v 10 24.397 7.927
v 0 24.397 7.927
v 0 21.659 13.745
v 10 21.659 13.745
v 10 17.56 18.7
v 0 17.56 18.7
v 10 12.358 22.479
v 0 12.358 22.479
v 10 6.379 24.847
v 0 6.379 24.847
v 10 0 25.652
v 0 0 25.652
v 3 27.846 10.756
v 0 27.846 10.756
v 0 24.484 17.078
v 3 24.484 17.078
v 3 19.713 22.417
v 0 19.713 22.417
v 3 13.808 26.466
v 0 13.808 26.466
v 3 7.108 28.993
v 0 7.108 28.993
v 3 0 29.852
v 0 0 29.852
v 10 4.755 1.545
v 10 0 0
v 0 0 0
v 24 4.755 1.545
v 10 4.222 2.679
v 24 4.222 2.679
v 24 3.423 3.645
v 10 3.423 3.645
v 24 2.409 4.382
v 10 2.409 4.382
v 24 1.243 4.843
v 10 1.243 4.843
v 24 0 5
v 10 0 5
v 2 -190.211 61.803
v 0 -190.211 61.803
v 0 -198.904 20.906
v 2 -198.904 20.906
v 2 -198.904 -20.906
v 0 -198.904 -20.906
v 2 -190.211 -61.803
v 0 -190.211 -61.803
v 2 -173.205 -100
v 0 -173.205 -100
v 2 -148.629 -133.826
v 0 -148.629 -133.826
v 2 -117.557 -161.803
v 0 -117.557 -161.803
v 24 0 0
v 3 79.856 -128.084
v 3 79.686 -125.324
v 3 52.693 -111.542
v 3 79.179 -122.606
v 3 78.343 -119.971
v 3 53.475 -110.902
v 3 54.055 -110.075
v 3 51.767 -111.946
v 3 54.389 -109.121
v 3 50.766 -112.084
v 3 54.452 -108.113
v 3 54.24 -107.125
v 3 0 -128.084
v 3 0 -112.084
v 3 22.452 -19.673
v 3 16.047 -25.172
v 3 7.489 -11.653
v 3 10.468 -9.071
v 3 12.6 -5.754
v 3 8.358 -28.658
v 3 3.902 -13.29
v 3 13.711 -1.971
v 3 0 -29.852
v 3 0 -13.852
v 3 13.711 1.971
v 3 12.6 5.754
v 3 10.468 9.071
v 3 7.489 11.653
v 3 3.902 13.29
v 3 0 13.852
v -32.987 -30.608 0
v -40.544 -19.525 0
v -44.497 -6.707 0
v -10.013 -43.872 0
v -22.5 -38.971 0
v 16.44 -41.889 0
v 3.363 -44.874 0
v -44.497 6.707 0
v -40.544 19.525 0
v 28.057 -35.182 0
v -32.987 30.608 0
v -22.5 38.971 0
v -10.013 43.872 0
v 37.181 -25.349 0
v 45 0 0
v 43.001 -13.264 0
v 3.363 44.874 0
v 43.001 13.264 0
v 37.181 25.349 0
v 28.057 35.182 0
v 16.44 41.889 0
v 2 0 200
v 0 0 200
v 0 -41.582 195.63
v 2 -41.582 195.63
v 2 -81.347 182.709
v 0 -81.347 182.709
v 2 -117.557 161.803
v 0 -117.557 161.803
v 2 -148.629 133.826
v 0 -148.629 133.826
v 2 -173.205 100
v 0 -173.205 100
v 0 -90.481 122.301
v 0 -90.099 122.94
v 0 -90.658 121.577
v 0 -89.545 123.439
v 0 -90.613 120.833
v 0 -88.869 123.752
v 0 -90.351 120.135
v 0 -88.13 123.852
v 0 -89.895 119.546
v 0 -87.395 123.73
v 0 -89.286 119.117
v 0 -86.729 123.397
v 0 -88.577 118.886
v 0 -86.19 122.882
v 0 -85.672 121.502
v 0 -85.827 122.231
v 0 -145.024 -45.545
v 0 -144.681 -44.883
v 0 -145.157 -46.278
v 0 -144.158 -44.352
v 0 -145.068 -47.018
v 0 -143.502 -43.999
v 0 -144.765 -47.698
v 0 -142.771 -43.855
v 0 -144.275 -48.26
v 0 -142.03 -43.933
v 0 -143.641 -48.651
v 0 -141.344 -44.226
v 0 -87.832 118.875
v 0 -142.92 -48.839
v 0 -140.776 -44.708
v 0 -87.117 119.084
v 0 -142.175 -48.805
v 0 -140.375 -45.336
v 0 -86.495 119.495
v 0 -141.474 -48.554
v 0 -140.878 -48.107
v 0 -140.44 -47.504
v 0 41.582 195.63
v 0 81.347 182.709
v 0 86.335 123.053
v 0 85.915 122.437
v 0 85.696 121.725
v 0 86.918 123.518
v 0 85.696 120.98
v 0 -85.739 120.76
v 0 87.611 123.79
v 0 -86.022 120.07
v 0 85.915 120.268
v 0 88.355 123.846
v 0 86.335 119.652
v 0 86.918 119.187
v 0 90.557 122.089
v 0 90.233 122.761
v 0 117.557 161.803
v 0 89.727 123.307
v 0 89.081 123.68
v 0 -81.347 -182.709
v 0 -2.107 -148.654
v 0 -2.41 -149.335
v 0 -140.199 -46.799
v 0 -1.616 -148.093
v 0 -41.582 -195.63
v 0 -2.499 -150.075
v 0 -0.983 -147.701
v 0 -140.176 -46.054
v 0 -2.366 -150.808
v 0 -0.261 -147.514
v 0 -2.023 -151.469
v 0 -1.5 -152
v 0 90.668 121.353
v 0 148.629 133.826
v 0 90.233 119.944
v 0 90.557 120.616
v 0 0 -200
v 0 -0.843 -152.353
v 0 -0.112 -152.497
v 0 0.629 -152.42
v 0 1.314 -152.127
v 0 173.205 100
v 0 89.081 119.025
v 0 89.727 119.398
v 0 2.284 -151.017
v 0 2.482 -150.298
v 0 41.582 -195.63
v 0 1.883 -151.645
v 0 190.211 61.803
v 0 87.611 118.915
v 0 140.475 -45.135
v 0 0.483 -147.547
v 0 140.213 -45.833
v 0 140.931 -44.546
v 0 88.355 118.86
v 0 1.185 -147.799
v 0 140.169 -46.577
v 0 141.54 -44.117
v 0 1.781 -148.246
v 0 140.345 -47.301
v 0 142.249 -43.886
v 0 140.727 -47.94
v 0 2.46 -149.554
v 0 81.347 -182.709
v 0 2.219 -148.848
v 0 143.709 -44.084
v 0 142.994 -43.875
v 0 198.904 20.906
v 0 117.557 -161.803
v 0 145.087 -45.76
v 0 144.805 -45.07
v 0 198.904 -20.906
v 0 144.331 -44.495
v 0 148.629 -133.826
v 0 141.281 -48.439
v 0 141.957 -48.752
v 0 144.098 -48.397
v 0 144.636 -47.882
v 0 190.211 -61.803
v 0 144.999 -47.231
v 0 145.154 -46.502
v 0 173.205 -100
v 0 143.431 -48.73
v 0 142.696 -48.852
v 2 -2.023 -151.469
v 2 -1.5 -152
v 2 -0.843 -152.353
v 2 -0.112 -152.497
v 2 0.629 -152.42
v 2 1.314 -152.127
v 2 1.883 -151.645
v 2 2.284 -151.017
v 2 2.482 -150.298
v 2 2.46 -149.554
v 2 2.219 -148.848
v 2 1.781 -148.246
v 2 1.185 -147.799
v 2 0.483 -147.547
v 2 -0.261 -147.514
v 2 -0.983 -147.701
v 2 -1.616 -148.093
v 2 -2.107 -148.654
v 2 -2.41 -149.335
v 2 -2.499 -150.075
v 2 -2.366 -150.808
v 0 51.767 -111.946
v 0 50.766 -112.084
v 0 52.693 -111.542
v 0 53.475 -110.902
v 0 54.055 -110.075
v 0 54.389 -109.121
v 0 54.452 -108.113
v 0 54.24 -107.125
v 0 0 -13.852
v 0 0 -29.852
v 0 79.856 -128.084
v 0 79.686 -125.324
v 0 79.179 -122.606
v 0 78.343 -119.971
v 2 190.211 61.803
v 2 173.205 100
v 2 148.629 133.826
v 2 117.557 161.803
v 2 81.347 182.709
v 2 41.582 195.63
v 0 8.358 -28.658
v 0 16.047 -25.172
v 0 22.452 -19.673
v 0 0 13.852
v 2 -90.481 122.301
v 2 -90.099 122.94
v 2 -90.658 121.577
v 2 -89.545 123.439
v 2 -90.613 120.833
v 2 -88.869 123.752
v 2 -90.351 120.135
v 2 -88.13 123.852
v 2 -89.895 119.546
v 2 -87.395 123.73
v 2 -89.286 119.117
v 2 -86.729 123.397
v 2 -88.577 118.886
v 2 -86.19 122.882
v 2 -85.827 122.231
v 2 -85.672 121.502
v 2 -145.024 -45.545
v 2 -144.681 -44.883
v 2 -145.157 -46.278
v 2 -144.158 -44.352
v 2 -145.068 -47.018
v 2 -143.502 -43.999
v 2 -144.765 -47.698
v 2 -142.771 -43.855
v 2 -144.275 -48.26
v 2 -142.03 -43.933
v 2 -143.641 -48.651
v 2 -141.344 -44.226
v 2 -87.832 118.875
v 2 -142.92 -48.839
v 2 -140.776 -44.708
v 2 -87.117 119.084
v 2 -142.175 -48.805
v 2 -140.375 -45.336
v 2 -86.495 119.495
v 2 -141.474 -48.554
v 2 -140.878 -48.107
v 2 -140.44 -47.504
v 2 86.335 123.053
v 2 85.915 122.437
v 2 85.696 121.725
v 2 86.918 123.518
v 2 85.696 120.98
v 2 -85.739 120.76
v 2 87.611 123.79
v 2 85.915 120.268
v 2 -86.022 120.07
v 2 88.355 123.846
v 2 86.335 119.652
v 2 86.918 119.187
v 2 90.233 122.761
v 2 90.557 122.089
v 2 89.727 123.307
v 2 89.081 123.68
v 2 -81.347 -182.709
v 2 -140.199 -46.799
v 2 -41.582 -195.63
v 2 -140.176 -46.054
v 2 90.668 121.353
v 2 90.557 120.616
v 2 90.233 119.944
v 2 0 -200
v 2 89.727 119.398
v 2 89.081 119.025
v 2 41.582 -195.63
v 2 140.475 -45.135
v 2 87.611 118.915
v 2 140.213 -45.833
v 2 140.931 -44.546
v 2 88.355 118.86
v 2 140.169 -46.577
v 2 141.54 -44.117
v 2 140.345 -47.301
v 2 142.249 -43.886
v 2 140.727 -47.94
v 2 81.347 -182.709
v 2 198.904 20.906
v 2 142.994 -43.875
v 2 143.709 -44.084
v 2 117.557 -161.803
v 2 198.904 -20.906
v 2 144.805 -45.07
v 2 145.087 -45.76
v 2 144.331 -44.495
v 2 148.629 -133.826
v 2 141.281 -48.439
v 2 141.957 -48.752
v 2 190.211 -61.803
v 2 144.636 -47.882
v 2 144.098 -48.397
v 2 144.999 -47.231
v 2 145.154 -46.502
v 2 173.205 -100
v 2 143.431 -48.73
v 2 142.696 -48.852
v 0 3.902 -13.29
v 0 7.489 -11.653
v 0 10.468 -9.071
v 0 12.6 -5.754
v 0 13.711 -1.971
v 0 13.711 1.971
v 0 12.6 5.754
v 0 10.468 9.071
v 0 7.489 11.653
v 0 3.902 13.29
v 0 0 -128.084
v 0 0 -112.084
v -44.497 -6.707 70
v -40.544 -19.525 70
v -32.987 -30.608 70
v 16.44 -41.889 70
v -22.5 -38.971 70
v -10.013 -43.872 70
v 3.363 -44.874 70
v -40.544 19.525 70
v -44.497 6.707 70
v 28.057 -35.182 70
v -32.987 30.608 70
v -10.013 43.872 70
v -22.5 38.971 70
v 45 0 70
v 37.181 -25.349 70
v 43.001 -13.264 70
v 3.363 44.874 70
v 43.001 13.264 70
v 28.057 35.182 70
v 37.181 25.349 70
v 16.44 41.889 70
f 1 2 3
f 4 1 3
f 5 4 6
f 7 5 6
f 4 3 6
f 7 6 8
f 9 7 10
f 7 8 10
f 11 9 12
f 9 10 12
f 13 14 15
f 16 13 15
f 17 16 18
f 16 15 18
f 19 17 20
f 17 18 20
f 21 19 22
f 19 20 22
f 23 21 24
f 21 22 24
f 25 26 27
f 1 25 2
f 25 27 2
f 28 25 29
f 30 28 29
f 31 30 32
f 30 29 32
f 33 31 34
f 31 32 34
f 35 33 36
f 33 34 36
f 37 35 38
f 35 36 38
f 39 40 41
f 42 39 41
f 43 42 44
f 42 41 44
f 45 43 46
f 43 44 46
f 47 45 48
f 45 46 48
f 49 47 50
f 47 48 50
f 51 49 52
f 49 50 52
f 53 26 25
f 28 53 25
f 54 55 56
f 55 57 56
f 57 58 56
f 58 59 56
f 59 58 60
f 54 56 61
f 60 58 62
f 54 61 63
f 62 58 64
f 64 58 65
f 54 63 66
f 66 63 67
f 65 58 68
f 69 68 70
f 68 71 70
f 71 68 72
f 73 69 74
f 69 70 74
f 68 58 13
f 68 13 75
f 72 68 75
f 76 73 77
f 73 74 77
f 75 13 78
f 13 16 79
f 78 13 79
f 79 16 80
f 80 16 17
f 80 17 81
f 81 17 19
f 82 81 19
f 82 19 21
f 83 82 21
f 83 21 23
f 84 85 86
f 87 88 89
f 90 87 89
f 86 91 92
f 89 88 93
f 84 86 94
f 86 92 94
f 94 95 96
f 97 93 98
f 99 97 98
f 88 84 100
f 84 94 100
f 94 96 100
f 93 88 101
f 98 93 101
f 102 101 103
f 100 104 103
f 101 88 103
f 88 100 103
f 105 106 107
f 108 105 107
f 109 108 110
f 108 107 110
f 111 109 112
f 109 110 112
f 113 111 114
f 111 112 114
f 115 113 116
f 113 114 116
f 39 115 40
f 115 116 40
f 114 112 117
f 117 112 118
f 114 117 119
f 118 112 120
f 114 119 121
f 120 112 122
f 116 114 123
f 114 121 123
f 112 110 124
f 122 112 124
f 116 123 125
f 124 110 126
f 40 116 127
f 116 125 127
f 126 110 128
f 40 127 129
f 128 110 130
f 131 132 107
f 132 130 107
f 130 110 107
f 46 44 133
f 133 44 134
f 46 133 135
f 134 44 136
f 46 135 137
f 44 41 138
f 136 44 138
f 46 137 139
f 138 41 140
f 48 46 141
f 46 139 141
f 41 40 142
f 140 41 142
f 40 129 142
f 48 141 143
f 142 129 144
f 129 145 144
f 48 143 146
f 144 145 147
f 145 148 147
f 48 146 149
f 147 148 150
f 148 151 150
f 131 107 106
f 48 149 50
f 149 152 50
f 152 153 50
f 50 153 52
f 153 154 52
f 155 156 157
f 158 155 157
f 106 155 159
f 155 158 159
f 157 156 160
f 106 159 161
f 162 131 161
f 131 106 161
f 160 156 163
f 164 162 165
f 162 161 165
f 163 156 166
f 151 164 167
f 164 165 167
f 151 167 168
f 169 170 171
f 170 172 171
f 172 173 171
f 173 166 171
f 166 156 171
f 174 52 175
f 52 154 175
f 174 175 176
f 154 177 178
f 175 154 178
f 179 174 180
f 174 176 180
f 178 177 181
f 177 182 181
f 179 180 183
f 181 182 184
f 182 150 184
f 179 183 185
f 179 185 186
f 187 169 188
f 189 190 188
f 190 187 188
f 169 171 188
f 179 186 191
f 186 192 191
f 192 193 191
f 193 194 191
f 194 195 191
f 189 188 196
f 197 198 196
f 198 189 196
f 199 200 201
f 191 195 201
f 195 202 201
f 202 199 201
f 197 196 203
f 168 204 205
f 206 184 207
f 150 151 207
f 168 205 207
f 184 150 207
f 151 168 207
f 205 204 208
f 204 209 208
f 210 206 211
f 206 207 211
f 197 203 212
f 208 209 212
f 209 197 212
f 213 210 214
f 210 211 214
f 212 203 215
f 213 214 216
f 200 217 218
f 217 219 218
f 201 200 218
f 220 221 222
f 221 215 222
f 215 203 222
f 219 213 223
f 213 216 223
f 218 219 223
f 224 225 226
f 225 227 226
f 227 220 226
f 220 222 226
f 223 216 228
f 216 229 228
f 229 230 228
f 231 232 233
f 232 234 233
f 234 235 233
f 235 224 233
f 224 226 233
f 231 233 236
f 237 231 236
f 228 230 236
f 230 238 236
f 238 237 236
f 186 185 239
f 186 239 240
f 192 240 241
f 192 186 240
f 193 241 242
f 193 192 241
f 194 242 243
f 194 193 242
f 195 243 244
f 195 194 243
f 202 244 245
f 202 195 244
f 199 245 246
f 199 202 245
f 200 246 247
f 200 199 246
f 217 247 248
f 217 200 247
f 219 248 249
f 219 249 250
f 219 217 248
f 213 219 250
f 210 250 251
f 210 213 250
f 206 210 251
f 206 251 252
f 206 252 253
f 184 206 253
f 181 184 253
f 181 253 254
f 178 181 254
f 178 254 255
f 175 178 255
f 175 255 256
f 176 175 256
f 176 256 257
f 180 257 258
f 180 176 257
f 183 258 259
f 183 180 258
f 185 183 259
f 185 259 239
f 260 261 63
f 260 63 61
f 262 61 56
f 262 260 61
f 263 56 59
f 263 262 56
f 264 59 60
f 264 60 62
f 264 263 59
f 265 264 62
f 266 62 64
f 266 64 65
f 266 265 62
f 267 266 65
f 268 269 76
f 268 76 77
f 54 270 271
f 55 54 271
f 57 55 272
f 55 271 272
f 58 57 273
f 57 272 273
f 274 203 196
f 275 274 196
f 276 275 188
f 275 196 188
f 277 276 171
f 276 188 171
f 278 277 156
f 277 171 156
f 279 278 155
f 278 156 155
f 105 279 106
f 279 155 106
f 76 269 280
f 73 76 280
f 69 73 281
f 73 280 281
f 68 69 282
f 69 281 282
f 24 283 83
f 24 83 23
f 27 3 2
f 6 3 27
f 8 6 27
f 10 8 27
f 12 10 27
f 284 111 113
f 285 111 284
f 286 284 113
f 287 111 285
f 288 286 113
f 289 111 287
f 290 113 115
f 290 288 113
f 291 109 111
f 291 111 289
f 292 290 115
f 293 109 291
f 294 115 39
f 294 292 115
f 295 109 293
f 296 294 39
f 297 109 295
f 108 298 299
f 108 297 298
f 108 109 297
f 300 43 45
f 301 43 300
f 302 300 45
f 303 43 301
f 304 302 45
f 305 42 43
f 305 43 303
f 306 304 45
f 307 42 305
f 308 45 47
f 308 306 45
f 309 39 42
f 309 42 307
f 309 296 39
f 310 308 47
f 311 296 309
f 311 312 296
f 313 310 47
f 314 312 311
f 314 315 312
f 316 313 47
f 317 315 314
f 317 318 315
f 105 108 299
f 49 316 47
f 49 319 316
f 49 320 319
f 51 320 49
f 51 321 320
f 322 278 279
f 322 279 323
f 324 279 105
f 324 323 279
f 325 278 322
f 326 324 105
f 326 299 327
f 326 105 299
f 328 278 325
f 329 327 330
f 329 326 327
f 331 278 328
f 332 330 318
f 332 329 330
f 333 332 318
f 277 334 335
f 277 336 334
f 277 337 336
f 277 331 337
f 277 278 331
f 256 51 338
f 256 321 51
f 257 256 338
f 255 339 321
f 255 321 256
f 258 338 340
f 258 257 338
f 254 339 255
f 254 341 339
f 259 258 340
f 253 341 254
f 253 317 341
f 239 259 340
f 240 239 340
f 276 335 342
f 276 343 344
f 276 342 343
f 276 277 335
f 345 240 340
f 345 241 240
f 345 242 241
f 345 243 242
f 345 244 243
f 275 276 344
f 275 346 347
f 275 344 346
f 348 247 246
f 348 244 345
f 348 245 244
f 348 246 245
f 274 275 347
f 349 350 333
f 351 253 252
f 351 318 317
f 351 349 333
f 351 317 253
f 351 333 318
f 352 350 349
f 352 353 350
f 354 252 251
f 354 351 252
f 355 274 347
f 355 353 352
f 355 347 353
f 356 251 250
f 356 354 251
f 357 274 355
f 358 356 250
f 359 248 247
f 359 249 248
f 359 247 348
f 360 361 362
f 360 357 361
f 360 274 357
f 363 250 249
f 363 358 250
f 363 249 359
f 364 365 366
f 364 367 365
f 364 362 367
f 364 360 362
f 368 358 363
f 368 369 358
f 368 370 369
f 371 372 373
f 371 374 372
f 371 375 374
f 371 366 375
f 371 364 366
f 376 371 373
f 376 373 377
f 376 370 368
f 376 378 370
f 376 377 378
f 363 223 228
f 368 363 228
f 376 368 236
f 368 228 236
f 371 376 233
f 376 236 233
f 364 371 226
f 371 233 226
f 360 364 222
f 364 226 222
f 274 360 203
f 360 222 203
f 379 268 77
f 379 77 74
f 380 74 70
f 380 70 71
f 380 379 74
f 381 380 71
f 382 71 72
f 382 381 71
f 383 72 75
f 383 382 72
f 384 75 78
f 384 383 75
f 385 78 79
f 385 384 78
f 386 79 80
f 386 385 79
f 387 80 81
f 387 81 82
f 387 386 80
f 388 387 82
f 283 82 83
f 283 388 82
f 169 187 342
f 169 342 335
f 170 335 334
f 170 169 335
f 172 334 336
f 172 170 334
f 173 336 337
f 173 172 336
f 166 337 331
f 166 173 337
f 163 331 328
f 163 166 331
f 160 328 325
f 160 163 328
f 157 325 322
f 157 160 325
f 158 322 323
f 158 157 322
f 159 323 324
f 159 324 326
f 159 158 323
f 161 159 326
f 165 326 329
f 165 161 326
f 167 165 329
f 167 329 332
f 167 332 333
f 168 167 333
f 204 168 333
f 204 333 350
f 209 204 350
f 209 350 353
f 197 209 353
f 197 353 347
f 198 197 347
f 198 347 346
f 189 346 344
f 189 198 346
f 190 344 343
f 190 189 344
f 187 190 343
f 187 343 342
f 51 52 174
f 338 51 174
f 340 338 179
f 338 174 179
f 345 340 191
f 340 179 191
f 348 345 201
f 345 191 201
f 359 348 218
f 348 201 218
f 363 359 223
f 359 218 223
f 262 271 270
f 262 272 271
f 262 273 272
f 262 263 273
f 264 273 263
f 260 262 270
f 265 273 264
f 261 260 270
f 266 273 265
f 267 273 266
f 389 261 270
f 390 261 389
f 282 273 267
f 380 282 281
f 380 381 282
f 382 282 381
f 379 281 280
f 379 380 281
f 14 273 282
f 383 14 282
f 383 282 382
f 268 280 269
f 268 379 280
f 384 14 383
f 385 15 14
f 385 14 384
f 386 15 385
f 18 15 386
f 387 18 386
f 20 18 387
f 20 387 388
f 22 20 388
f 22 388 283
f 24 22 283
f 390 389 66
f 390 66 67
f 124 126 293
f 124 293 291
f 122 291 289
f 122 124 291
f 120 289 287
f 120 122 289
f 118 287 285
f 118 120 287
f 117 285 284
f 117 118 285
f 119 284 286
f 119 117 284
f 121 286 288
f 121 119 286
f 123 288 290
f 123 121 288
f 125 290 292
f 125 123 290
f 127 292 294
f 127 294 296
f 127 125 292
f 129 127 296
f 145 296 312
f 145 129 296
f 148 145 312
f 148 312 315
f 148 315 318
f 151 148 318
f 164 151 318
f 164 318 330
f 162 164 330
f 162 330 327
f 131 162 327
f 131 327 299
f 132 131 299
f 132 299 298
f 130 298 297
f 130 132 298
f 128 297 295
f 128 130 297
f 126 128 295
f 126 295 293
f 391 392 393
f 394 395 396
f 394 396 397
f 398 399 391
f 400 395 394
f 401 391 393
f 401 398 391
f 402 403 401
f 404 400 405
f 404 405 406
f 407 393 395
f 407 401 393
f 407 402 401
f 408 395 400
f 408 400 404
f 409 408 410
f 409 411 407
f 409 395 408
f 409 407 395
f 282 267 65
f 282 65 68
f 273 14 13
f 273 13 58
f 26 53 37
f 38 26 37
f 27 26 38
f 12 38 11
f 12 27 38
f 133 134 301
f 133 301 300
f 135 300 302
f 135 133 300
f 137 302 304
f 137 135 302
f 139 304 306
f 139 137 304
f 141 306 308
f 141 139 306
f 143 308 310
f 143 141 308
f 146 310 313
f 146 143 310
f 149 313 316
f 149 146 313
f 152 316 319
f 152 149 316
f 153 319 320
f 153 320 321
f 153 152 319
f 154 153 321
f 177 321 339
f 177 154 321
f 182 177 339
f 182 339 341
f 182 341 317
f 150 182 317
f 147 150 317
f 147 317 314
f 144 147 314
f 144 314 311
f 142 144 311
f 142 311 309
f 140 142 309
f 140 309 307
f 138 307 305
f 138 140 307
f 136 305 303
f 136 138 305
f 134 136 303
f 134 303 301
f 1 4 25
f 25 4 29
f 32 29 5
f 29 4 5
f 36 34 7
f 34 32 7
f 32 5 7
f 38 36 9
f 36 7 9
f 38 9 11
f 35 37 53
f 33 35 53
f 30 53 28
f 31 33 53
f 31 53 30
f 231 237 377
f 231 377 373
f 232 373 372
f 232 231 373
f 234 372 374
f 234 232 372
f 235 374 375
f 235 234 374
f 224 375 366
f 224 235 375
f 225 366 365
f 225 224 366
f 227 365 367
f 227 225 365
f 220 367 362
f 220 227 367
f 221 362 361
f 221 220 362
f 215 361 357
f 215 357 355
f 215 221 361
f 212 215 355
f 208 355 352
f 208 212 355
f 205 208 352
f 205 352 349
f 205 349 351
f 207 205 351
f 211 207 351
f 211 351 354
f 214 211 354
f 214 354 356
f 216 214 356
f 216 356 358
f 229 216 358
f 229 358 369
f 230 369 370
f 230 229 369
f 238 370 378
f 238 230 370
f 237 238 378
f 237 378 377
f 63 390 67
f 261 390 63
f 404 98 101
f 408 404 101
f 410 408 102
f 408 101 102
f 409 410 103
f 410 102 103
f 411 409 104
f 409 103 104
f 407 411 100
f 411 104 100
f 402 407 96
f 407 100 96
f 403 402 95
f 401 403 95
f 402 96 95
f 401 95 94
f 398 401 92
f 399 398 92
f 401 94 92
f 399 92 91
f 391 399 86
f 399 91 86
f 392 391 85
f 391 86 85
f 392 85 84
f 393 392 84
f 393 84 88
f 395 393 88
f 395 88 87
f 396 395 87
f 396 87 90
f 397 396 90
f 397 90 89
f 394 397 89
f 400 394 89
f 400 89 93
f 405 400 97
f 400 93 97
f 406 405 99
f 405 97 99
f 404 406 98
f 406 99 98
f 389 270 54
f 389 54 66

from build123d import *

# Parameters (mm, degrees)
PAD_DEPTH          = 3
PAD001_DEPTH       = 10
PAD002_DEPTH       = 24
CYLINDER_R         = 45
CYLINDER_DEPTH     = 70
SKETCH003_R        = 2.5
PAD003_DEPTH       = 2
POLARPATTERN_COUNT = 5


with BuildPart() as body:
    # Sketch → Pad (new body)
    with BuildSketch(Plane.YZ):
        with BuildLine():
            ThreePointArc((0, -13.851561), (13.851561, 0), (0, 13.851561))
            Line((0, 13.851561), (0, 29.851561))
            ThreePointArc((27.84628, 10.756412), (16.882239, 24.619214), (0, 29.851561))
            Line((27.84628, 10.756412), (78.343417, -119.970962))
            ThreePointArc((79.855864, -128.083789), (79.474523, -123.957488), (78.343417, -119.970962))
            Line((79.855864, -128.083789), (0, -128.083789))
            Line((0, -128.083789), (0, -112.083789))
            Line((0, -112.083789), (50.766069, -112.083789))
            ThreePointArc((50.766069, -112.083789), (53.793496, -110.508222), (54.24005, -107.124686))
            Line((54.24005, -107.124686), (22.452344, -19.672517))
            ThreePointArc((0, -29.851561), (12.325996, -27.187966), (22.452344, -19.672517))
            Line((0, -29.851561), (0, -13.851561))
        make_face()
    extrude(amount=PAD_DEPTH)


with BuildPart() as body001:
    # Sketch001 → Pad001 (new body)
    with BuildSketch(Plane.YZ):
        with BuildLine():
            Line((0, 0), (0, 25.652428))
            ThreePointArc((24.396909, 7.927036), (15.078119, 20.75325), (0, 25.652428))
            Line((0, 0), (24.396909, 7.927036))
        make_face()
    extrude(amount=PAD001_DEPTH)

    # Sketch002 → Pad002 (join)
    with BuildSketch(Plane.YZ):
        with BuildLine():
            ThreePointArc((4.755283, 1.545085), (2.938926, 4.045085), (0, 5))
            Line((0, 0), (0, 5))
            Line((0, 0), (4.755283, 1.545085))
        make_face()
    extrude(amount=PAD002_DEPTH)


with BuildPart() as cylinder:
    # Cylinder → Cylinder (new body)
    with BuildSketch(Plane.XY):
        Circle(CYLINDER_R)
    extrude(amount=CYLINDER_DEPTH)


with BuildPart() as body002:
    # Sketch003 → Pad003 (new body)
    with BuildSketch(Plane.YZ):
        with BuildLine():
            ThreePointArc((190.211303, 61.803399), (117.55705, 161.803399), (0, 200))
            Line((0, 0), (0, 200))
            Line((0, 0), (190.211303, 61.803399))
        make_face()
        with Locations((88.167788, 121.352549)):
            Circle(SKETCH003_R, mode=Mode.SUBTRACT)
    pad003 = extrude(amount=PAD003_DEPTH)

    # PolarPattern: Pad003 ×5 about axis
    polarpattern_axis = Axis((0, 0, 0), (1, 0, 0))
    for i in range(1, POLARPATTERN_COUNT):
        add(pad003.rotate(polarpattern_axis, i * 360 / POLARPATTERN_COUNT))


solid = Compound([body.part, body001.part, cylinder.part, body002.part])
